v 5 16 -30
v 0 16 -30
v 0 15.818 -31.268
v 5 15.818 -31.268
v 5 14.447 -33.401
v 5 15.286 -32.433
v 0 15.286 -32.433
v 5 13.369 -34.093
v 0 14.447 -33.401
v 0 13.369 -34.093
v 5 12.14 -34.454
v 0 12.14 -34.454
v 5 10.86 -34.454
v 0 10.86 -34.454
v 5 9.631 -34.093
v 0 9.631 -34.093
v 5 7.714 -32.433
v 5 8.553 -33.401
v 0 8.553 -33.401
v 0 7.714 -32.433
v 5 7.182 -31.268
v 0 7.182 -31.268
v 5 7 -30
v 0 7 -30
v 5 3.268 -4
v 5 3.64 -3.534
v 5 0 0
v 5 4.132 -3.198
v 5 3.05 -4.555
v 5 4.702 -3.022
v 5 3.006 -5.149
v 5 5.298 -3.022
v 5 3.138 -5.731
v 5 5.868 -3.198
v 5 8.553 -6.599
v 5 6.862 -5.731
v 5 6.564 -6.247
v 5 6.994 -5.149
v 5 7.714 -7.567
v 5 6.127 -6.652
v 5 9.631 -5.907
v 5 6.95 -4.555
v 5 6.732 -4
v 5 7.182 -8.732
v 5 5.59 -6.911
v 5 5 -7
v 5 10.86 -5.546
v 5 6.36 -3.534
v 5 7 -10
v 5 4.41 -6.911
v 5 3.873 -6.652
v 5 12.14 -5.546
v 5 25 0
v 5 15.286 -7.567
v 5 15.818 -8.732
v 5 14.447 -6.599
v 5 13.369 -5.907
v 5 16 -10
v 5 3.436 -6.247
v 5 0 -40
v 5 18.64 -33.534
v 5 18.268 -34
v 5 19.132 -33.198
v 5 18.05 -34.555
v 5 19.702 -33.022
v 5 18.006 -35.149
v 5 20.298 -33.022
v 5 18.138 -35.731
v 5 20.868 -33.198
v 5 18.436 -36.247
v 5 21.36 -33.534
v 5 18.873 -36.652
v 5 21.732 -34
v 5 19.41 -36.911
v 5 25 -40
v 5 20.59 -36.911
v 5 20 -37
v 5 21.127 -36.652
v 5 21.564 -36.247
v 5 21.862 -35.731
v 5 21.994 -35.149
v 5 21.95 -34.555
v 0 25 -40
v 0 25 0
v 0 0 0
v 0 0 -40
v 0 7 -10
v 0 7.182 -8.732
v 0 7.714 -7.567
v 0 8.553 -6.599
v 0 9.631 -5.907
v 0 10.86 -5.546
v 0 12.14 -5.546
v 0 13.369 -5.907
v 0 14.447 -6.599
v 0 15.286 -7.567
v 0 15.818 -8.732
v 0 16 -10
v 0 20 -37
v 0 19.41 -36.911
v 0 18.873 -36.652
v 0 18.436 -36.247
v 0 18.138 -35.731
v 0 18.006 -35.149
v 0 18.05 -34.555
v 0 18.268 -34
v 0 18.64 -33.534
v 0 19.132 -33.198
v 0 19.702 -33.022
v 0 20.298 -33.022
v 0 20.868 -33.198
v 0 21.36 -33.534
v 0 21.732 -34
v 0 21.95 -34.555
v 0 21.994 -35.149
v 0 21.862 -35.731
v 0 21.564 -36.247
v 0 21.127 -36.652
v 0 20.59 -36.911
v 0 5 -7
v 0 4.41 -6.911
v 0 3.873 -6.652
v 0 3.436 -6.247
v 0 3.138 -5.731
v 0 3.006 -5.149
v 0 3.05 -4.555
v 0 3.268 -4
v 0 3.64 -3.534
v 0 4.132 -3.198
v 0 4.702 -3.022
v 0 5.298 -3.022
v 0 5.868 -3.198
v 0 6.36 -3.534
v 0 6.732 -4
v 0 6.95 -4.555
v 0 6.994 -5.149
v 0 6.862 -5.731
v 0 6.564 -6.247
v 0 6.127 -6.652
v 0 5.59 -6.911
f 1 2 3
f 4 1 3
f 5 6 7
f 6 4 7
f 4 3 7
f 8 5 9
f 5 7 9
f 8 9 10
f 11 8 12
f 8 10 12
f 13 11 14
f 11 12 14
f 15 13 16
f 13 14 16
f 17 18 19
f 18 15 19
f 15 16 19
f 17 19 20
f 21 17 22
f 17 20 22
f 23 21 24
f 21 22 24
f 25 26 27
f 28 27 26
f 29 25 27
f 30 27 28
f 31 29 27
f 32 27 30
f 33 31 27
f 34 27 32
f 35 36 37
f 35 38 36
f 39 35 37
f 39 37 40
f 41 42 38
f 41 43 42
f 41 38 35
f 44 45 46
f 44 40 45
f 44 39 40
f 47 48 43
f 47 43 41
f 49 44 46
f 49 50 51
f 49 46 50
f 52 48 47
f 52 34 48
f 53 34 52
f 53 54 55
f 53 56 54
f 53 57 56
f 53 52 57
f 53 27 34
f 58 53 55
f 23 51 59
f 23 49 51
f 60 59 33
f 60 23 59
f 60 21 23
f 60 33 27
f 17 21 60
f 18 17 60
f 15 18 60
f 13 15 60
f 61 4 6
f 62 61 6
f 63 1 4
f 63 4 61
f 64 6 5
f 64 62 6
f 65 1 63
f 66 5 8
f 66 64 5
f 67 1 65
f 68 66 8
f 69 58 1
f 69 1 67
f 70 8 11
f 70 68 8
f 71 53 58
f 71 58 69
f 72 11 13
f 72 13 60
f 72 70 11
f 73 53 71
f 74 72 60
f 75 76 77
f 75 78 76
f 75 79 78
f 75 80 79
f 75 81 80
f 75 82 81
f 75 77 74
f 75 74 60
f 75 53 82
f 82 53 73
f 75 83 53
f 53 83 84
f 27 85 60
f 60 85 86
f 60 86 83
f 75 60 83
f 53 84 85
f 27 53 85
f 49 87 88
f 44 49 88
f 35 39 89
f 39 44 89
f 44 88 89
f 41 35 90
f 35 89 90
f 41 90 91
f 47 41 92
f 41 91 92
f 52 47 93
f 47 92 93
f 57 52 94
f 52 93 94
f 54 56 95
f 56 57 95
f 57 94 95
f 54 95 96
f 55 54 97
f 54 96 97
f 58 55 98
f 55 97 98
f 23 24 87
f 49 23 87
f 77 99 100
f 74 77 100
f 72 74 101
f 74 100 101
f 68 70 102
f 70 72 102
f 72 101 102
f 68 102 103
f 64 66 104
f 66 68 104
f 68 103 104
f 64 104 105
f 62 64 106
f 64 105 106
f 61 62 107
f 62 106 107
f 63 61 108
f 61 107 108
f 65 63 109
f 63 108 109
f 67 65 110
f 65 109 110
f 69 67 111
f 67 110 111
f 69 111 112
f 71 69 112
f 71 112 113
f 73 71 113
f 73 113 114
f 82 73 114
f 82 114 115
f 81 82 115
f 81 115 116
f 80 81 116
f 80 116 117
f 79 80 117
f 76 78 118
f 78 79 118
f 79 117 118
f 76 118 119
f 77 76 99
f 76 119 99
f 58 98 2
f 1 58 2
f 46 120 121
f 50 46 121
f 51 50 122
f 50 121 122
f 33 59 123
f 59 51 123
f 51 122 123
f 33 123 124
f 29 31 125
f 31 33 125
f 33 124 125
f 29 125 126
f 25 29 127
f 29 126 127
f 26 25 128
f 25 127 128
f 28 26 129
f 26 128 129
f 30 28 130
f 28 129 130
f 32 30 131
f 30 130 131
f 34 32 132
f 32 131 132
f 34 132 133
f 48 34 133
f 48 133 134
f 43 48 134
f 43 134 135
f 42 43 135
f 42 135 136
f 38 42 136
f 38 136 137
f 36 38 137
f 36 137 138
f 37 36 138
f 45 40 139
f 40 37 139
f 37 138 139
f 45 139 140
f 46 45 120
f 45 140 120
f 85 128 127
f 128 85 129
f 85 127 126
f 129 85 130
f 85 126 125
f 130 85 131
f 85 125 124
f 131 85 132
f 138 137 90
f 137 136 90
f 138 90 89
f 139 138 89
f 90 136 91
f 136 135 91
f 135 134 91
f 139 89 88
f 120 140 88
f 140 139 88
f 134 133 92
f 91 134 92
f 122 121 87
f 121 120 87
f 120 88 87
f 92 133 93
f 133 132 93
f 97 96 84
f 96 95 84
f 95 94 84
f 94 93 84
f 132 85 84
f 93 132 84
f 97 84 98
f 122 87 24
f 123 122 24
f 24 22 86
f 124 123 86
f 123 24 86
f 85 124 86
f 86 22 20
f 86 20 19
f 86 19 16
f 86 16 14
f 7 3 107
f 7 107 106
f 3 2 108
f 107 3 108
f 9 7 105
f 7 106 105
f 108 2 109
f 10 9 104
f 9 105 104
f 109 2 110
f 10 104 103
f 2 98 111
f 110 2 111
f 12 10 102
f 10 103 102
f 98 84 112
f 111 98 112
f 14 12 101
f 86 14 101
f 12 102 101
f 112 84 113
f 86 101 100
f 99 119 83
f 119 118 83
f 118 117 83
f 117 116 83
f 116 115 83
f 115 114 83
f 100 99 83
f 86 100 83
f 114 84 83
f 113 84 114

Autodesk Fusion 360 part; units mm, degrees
sketch "Sketch1" plane through (0, 0, 0) normal (1, 0, 0) x (0, 0, -1)
  line L0 (0, 0) -> (40, 0)
  line L1 (40, 0) -> (40, 25)
  line L2 (40, 25) -> (0, 25)
  line L3 (0, 25) -> (0, 0)
  circle A0 centre (35, 20) radius 2
  circle A1 centre (5, 5) radius 2
  line L4 (10, 16) -> (30, 16)
  arc A2 (30, 7) -> (30, 16) centre (30, 11.5) ccw
  line L5 (30, 7) -> (10, 7)
  arc A3 (10, 16) -> (10, 7) centre (10, 11.5) ccw
  dimension "d1" = 40
  dimension "d2" = 25
  dimension "d3" = 4
  dimension "d4" = 4
  dimension "d5" = 5
  dimension "d7" = 35
  dimension "d8" = 5
  dimension "d9" = 35
  dimension "d10" = 9
  dimension "d11" = 20
  dimension "d12" = 7
  dimension "d14" = 10
extrude "Extrude1" add sketch "Sketch1" along normal blind 5
